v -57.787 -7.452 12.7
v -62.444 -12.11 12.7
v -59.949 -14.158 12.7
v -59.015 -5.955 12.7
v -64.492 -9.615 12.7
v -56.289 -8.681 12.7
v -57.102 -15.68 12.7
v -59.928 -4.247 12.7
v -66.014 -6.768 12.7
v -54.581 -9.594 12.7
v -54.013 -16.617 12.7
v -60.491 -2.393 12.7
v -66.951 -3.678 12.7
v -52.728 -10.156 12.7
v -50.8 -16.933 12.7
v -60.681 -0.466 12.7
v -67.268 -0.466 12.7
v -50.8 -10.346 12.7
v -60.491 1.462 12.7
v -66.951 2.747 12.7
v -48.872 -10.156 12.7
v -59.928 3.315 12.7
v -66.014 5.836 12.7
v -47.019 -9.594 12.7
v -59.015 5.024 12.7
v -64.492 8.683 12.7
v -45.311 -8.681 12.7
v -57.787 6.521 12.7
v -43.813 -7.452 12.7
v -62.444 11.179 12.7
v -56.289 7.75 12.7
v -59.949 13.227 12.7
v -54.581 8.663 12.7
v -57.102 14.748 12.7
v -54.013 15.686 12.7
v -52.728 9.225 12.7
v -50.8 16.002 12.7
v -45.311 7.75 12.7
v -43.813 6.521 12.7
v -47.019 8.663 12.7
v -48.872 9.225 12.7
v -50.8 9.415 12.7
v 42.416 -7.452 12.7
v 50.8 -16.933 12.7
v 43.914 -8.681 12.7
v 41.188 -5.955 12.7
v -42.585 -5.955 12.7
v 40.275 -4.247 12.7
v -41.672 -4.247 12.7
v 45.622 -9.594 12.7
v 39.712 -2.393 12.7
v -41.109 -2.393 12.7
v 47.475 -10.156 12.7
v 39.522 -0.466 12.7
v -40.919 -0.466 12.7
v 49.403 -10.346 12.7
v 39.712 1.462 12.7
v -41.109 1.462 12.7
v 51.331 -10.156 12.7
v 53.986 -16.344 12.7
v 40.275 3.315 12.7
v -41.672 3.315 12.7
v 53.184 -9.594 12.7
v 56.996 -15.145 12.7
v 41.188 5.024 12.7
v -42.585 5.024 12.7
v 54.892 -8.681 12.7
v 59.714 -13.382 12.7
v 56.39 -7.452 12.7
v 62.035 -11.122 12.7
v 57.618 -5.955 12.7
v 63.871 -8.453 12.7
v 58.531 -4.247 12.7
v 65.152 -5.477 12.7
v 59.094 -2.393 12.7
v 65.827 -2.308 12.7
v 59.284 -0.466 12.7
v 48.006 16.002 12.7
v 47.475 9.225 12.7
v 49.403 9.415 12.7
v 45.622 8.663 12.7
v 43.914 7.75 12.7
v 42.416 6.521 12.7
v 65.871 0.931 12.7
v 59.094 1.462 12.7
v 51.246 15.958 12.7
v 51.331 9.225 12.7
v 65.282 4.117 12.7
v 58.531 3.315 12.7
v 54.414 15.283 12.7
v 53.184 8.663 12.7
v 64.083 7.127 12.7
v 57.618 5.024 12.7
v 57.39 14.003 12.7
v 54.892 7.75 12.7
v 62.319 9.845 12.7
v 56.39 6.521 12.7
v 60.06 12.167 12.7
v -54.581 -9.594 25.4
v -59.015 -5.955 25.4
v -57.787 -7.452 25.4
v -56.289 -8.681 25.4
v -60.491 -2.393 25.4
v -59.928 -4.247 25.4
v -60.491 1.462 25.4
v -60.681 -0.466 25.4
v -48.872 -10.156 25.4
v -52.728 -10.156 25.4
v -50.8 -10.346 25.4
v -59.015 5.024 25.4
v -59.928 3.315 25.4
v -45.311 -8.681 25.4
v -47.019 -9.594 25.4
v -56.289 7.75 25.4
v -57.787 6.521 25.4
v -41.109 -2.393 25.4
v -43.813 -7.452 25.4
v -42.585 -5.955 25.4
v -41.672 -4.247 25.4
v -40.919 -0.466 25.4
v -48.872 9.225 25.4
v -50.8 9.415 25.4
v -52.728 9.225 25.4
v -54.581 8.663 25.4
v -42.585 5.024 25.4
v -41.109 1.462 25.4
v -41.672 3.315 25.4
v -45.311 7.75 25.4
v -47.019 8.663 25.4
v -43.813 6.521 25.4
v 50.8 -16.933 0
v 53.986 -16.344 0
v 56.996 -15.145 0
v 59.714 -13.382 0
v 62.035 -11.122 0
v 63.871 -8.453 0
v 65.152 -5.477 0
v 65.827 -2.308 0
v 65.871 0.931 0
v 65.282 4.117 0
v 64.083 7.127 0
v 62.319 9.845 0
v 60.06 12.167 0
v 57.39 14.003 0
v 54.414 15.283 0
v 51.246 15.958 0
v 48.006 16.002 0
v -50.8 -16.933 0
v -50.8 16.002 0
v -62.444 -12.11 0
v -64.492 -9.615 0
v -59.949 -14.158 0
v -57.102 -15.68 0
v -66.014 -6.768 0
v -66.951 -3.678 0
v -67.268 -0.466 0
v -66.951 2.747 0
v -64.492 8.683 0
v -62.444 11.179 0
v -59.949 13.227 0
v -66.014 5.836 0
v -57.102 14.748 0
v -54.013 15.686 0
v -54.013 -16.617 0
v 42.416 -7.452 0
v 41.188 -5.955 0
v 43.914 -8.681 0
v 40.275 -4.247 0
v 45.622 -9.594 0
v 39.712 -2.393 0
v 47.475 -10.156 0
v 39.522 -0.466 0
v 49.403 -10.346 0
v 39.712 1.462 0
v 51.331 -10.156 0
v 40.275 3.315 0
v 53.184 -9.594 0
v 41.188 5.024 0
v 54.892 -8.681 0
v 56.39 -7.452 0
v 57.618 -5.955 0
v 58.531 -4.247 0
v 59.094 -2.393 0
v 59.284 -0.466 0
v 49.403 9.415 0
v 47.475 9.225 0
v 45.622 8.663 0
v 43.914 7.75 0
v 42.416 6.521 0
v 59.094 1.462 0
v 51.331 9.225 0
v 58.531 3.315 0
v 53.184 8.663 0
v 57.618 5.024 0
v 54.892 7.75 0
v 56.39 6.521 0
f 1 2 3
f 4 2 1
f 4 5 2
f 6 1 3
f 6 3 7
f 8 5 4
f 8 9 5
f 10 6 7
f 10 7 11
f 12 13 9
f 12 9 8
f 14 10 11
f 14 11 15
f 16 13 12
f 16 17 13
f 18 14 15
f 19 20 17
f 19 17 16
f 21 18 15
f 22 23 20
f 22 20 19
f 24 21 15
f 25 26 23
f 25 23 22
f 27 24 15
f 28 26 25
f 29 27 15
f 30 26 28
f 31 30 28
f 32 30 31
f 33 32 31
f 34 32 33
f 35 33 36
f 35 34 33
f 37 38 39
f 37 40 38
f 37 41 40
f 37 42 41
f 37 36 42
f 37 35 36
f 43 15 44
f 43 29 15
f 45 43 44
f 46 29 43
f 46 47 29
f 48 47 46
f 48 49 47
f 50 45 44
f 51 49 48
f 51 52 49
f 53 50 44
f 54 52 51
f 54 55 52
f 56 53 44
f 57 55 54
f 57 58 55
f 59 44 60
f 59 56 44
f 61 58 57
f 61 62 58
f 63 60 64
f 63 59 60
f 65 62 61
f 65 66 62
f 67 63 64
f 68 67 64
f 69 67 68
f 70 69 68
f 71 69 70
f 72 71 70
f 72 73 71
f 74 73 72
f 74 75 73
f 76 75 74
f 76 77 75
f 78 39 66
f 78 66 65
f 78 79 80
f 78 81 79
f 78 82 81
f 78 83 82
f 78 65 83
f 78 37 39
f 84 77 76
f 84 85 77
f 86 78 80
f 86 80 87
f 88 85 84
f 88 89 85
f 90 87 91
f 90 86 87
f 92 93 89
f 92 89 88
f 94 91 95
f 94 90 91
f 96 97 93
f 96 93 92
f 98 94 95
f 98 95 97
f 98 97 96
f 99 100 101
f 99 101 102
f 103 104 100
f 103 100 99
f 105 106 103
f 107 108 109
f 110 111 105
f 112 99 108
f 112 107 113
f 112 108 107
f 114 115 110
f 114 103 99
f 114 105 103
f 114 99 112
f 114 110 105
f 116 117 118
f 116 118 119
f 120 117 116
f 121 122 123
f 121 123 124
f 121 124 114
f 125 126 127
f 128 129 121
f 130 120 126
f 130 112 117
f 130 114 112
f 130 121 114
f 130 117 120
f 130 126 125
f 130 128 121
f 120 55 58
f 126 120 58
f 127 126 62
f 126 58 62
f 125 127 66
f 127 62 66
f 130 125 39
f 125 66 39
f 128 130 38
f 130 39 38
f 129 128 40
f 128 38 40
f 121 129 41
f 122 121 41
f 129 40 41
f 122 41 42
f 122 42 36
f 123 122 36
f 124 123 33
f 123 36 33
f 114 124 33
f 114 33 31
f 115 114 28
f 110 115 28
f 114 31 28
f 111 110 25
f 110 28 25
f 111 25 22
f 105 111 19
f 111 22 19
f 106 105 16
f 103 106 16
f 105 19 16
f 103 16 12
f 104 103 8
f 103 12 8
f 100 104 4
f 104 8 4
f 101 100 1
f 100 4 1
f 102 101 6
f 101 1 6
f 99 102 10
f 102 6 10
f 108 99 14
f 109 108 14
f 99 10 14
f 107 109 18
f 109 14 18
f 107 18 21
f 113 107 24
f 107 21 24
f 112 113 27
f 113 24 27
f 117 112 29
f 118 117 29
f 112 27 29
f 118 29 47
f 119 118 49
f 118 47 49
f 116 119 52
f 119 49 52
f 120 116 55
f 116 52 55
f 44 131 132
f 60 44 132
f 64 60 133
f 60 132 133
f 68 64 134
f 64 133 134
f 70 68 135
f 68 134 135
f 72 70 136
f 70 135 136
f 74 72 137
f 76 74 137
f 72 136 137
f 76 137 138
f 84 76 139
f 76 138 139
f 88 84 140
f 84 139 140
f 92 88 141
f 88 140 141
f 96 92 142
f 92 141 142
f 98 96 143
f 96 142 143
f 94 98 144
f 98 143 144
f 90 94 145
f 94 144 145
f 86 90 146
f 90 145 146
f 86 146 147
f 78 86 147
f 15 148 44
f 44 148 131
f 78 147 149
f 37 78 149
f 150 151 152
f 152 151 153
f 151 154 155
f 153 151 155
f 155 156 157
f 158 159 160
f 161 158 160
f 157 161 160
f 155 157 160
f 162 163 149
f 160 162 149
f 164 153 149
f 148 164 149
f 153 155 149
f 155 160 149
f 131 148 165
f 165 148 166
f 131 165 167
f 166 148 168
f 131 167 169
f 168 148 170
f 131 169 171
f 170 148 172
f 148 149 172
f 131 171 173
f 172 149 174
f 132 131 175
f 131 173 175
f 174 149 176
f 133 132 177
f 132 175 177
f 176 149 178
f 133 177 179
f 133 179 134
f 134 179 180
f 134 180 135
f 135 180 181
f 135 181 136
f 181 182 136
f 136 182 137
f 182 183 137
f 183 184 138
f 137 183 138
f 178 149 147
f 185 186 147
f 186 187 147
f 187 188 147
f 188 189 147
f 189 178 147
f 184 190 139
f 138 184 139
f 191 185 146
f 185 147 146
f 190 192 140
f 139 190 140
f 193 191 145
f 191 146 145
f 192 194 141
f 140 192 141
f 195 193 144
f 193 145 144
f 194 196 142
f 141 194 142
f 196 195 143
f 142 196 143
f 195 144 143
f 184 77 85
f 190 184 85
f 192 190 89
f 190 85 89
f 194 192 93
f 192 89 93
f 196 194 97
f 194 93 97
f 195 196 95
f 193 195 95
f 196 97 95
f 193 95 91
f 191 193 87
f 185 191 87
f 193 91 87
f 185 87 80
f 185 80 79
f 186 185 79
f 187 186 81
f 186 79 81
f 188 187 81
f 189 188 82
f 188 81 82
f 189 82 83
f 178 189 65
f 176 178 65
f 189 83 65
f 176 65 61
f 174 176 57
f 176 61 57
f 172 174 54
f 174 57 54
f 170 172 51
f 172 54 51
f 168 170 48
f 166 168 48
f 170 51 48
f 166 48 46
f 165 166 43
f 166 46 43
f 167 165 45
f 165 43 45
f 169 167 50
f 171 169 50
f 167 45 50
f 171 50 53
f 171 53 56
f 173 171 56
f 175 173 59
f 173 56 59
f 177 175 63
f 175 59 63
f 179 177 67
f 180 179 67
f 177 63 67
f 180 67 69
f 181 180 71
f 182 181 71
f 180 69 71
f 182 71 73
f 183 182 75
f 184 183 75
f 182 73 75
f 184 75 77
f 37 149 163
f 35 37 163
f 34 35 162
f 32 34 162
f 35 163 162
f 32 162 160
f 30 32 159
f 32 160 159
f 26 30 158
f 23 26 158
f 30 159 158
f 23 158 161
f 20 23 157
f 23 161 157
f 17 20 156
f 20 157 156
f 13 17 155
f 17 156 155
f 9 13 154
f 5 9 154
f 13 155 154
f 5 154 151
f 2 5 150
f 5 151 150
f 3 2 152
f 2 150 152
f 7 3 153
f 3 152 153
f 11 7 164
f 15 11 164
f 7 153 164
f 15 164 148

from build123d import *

# Parameters (mm, degrees)
F2_DEPTH = 12.7
F3_R     = 9.8806
F4_DEPTH = 12.7
F5_DEPTH = 12.7


# Not quite as in the source:
# - a variable given as a bare number and used for a length is read in inches; the dataset says mm whatever the document's units were


with BuildPart() as f2:
    # F1 (on Top) → F2 (new body)
    with BuildSketch(Plane.XY):
        with BuildLine():
            ThreePointArc((50.8, -16.9333333333), (65.8706666667, 0.9313333333), (48.006, 16.002))
            Line((48.006, 16.002), (-50.8, 16.002))
            ThreePointArc((-50.8, 16.002), (-67.2676666667, -0.4656666667), (-50.8, -16.9333333333))
            Line((-50.8, -16.9333333333), (50.8, -16.9333333333))
        make_face()
    extrude(amount=F2_DEPTH)

    # F3 (on face) → F4 (join)
    with BuildSketch(Plane.XY.offset(12.7)):
        with Locations((-50.8, -0.4656666667)):
            Circle(F3_R)
    extrude(amount=F4_DEPTH)

    # F3 (on face) → F5 (cut)
    with BuildSketch(Plane.XY.offset(12.7)):
        with Locations((49.403, -0.4656666667)):
            Circle(F3_R)
    extrude(amount=-F5_DEPTH, mode=Mode.SUBTRACT)


solid = f2.part
